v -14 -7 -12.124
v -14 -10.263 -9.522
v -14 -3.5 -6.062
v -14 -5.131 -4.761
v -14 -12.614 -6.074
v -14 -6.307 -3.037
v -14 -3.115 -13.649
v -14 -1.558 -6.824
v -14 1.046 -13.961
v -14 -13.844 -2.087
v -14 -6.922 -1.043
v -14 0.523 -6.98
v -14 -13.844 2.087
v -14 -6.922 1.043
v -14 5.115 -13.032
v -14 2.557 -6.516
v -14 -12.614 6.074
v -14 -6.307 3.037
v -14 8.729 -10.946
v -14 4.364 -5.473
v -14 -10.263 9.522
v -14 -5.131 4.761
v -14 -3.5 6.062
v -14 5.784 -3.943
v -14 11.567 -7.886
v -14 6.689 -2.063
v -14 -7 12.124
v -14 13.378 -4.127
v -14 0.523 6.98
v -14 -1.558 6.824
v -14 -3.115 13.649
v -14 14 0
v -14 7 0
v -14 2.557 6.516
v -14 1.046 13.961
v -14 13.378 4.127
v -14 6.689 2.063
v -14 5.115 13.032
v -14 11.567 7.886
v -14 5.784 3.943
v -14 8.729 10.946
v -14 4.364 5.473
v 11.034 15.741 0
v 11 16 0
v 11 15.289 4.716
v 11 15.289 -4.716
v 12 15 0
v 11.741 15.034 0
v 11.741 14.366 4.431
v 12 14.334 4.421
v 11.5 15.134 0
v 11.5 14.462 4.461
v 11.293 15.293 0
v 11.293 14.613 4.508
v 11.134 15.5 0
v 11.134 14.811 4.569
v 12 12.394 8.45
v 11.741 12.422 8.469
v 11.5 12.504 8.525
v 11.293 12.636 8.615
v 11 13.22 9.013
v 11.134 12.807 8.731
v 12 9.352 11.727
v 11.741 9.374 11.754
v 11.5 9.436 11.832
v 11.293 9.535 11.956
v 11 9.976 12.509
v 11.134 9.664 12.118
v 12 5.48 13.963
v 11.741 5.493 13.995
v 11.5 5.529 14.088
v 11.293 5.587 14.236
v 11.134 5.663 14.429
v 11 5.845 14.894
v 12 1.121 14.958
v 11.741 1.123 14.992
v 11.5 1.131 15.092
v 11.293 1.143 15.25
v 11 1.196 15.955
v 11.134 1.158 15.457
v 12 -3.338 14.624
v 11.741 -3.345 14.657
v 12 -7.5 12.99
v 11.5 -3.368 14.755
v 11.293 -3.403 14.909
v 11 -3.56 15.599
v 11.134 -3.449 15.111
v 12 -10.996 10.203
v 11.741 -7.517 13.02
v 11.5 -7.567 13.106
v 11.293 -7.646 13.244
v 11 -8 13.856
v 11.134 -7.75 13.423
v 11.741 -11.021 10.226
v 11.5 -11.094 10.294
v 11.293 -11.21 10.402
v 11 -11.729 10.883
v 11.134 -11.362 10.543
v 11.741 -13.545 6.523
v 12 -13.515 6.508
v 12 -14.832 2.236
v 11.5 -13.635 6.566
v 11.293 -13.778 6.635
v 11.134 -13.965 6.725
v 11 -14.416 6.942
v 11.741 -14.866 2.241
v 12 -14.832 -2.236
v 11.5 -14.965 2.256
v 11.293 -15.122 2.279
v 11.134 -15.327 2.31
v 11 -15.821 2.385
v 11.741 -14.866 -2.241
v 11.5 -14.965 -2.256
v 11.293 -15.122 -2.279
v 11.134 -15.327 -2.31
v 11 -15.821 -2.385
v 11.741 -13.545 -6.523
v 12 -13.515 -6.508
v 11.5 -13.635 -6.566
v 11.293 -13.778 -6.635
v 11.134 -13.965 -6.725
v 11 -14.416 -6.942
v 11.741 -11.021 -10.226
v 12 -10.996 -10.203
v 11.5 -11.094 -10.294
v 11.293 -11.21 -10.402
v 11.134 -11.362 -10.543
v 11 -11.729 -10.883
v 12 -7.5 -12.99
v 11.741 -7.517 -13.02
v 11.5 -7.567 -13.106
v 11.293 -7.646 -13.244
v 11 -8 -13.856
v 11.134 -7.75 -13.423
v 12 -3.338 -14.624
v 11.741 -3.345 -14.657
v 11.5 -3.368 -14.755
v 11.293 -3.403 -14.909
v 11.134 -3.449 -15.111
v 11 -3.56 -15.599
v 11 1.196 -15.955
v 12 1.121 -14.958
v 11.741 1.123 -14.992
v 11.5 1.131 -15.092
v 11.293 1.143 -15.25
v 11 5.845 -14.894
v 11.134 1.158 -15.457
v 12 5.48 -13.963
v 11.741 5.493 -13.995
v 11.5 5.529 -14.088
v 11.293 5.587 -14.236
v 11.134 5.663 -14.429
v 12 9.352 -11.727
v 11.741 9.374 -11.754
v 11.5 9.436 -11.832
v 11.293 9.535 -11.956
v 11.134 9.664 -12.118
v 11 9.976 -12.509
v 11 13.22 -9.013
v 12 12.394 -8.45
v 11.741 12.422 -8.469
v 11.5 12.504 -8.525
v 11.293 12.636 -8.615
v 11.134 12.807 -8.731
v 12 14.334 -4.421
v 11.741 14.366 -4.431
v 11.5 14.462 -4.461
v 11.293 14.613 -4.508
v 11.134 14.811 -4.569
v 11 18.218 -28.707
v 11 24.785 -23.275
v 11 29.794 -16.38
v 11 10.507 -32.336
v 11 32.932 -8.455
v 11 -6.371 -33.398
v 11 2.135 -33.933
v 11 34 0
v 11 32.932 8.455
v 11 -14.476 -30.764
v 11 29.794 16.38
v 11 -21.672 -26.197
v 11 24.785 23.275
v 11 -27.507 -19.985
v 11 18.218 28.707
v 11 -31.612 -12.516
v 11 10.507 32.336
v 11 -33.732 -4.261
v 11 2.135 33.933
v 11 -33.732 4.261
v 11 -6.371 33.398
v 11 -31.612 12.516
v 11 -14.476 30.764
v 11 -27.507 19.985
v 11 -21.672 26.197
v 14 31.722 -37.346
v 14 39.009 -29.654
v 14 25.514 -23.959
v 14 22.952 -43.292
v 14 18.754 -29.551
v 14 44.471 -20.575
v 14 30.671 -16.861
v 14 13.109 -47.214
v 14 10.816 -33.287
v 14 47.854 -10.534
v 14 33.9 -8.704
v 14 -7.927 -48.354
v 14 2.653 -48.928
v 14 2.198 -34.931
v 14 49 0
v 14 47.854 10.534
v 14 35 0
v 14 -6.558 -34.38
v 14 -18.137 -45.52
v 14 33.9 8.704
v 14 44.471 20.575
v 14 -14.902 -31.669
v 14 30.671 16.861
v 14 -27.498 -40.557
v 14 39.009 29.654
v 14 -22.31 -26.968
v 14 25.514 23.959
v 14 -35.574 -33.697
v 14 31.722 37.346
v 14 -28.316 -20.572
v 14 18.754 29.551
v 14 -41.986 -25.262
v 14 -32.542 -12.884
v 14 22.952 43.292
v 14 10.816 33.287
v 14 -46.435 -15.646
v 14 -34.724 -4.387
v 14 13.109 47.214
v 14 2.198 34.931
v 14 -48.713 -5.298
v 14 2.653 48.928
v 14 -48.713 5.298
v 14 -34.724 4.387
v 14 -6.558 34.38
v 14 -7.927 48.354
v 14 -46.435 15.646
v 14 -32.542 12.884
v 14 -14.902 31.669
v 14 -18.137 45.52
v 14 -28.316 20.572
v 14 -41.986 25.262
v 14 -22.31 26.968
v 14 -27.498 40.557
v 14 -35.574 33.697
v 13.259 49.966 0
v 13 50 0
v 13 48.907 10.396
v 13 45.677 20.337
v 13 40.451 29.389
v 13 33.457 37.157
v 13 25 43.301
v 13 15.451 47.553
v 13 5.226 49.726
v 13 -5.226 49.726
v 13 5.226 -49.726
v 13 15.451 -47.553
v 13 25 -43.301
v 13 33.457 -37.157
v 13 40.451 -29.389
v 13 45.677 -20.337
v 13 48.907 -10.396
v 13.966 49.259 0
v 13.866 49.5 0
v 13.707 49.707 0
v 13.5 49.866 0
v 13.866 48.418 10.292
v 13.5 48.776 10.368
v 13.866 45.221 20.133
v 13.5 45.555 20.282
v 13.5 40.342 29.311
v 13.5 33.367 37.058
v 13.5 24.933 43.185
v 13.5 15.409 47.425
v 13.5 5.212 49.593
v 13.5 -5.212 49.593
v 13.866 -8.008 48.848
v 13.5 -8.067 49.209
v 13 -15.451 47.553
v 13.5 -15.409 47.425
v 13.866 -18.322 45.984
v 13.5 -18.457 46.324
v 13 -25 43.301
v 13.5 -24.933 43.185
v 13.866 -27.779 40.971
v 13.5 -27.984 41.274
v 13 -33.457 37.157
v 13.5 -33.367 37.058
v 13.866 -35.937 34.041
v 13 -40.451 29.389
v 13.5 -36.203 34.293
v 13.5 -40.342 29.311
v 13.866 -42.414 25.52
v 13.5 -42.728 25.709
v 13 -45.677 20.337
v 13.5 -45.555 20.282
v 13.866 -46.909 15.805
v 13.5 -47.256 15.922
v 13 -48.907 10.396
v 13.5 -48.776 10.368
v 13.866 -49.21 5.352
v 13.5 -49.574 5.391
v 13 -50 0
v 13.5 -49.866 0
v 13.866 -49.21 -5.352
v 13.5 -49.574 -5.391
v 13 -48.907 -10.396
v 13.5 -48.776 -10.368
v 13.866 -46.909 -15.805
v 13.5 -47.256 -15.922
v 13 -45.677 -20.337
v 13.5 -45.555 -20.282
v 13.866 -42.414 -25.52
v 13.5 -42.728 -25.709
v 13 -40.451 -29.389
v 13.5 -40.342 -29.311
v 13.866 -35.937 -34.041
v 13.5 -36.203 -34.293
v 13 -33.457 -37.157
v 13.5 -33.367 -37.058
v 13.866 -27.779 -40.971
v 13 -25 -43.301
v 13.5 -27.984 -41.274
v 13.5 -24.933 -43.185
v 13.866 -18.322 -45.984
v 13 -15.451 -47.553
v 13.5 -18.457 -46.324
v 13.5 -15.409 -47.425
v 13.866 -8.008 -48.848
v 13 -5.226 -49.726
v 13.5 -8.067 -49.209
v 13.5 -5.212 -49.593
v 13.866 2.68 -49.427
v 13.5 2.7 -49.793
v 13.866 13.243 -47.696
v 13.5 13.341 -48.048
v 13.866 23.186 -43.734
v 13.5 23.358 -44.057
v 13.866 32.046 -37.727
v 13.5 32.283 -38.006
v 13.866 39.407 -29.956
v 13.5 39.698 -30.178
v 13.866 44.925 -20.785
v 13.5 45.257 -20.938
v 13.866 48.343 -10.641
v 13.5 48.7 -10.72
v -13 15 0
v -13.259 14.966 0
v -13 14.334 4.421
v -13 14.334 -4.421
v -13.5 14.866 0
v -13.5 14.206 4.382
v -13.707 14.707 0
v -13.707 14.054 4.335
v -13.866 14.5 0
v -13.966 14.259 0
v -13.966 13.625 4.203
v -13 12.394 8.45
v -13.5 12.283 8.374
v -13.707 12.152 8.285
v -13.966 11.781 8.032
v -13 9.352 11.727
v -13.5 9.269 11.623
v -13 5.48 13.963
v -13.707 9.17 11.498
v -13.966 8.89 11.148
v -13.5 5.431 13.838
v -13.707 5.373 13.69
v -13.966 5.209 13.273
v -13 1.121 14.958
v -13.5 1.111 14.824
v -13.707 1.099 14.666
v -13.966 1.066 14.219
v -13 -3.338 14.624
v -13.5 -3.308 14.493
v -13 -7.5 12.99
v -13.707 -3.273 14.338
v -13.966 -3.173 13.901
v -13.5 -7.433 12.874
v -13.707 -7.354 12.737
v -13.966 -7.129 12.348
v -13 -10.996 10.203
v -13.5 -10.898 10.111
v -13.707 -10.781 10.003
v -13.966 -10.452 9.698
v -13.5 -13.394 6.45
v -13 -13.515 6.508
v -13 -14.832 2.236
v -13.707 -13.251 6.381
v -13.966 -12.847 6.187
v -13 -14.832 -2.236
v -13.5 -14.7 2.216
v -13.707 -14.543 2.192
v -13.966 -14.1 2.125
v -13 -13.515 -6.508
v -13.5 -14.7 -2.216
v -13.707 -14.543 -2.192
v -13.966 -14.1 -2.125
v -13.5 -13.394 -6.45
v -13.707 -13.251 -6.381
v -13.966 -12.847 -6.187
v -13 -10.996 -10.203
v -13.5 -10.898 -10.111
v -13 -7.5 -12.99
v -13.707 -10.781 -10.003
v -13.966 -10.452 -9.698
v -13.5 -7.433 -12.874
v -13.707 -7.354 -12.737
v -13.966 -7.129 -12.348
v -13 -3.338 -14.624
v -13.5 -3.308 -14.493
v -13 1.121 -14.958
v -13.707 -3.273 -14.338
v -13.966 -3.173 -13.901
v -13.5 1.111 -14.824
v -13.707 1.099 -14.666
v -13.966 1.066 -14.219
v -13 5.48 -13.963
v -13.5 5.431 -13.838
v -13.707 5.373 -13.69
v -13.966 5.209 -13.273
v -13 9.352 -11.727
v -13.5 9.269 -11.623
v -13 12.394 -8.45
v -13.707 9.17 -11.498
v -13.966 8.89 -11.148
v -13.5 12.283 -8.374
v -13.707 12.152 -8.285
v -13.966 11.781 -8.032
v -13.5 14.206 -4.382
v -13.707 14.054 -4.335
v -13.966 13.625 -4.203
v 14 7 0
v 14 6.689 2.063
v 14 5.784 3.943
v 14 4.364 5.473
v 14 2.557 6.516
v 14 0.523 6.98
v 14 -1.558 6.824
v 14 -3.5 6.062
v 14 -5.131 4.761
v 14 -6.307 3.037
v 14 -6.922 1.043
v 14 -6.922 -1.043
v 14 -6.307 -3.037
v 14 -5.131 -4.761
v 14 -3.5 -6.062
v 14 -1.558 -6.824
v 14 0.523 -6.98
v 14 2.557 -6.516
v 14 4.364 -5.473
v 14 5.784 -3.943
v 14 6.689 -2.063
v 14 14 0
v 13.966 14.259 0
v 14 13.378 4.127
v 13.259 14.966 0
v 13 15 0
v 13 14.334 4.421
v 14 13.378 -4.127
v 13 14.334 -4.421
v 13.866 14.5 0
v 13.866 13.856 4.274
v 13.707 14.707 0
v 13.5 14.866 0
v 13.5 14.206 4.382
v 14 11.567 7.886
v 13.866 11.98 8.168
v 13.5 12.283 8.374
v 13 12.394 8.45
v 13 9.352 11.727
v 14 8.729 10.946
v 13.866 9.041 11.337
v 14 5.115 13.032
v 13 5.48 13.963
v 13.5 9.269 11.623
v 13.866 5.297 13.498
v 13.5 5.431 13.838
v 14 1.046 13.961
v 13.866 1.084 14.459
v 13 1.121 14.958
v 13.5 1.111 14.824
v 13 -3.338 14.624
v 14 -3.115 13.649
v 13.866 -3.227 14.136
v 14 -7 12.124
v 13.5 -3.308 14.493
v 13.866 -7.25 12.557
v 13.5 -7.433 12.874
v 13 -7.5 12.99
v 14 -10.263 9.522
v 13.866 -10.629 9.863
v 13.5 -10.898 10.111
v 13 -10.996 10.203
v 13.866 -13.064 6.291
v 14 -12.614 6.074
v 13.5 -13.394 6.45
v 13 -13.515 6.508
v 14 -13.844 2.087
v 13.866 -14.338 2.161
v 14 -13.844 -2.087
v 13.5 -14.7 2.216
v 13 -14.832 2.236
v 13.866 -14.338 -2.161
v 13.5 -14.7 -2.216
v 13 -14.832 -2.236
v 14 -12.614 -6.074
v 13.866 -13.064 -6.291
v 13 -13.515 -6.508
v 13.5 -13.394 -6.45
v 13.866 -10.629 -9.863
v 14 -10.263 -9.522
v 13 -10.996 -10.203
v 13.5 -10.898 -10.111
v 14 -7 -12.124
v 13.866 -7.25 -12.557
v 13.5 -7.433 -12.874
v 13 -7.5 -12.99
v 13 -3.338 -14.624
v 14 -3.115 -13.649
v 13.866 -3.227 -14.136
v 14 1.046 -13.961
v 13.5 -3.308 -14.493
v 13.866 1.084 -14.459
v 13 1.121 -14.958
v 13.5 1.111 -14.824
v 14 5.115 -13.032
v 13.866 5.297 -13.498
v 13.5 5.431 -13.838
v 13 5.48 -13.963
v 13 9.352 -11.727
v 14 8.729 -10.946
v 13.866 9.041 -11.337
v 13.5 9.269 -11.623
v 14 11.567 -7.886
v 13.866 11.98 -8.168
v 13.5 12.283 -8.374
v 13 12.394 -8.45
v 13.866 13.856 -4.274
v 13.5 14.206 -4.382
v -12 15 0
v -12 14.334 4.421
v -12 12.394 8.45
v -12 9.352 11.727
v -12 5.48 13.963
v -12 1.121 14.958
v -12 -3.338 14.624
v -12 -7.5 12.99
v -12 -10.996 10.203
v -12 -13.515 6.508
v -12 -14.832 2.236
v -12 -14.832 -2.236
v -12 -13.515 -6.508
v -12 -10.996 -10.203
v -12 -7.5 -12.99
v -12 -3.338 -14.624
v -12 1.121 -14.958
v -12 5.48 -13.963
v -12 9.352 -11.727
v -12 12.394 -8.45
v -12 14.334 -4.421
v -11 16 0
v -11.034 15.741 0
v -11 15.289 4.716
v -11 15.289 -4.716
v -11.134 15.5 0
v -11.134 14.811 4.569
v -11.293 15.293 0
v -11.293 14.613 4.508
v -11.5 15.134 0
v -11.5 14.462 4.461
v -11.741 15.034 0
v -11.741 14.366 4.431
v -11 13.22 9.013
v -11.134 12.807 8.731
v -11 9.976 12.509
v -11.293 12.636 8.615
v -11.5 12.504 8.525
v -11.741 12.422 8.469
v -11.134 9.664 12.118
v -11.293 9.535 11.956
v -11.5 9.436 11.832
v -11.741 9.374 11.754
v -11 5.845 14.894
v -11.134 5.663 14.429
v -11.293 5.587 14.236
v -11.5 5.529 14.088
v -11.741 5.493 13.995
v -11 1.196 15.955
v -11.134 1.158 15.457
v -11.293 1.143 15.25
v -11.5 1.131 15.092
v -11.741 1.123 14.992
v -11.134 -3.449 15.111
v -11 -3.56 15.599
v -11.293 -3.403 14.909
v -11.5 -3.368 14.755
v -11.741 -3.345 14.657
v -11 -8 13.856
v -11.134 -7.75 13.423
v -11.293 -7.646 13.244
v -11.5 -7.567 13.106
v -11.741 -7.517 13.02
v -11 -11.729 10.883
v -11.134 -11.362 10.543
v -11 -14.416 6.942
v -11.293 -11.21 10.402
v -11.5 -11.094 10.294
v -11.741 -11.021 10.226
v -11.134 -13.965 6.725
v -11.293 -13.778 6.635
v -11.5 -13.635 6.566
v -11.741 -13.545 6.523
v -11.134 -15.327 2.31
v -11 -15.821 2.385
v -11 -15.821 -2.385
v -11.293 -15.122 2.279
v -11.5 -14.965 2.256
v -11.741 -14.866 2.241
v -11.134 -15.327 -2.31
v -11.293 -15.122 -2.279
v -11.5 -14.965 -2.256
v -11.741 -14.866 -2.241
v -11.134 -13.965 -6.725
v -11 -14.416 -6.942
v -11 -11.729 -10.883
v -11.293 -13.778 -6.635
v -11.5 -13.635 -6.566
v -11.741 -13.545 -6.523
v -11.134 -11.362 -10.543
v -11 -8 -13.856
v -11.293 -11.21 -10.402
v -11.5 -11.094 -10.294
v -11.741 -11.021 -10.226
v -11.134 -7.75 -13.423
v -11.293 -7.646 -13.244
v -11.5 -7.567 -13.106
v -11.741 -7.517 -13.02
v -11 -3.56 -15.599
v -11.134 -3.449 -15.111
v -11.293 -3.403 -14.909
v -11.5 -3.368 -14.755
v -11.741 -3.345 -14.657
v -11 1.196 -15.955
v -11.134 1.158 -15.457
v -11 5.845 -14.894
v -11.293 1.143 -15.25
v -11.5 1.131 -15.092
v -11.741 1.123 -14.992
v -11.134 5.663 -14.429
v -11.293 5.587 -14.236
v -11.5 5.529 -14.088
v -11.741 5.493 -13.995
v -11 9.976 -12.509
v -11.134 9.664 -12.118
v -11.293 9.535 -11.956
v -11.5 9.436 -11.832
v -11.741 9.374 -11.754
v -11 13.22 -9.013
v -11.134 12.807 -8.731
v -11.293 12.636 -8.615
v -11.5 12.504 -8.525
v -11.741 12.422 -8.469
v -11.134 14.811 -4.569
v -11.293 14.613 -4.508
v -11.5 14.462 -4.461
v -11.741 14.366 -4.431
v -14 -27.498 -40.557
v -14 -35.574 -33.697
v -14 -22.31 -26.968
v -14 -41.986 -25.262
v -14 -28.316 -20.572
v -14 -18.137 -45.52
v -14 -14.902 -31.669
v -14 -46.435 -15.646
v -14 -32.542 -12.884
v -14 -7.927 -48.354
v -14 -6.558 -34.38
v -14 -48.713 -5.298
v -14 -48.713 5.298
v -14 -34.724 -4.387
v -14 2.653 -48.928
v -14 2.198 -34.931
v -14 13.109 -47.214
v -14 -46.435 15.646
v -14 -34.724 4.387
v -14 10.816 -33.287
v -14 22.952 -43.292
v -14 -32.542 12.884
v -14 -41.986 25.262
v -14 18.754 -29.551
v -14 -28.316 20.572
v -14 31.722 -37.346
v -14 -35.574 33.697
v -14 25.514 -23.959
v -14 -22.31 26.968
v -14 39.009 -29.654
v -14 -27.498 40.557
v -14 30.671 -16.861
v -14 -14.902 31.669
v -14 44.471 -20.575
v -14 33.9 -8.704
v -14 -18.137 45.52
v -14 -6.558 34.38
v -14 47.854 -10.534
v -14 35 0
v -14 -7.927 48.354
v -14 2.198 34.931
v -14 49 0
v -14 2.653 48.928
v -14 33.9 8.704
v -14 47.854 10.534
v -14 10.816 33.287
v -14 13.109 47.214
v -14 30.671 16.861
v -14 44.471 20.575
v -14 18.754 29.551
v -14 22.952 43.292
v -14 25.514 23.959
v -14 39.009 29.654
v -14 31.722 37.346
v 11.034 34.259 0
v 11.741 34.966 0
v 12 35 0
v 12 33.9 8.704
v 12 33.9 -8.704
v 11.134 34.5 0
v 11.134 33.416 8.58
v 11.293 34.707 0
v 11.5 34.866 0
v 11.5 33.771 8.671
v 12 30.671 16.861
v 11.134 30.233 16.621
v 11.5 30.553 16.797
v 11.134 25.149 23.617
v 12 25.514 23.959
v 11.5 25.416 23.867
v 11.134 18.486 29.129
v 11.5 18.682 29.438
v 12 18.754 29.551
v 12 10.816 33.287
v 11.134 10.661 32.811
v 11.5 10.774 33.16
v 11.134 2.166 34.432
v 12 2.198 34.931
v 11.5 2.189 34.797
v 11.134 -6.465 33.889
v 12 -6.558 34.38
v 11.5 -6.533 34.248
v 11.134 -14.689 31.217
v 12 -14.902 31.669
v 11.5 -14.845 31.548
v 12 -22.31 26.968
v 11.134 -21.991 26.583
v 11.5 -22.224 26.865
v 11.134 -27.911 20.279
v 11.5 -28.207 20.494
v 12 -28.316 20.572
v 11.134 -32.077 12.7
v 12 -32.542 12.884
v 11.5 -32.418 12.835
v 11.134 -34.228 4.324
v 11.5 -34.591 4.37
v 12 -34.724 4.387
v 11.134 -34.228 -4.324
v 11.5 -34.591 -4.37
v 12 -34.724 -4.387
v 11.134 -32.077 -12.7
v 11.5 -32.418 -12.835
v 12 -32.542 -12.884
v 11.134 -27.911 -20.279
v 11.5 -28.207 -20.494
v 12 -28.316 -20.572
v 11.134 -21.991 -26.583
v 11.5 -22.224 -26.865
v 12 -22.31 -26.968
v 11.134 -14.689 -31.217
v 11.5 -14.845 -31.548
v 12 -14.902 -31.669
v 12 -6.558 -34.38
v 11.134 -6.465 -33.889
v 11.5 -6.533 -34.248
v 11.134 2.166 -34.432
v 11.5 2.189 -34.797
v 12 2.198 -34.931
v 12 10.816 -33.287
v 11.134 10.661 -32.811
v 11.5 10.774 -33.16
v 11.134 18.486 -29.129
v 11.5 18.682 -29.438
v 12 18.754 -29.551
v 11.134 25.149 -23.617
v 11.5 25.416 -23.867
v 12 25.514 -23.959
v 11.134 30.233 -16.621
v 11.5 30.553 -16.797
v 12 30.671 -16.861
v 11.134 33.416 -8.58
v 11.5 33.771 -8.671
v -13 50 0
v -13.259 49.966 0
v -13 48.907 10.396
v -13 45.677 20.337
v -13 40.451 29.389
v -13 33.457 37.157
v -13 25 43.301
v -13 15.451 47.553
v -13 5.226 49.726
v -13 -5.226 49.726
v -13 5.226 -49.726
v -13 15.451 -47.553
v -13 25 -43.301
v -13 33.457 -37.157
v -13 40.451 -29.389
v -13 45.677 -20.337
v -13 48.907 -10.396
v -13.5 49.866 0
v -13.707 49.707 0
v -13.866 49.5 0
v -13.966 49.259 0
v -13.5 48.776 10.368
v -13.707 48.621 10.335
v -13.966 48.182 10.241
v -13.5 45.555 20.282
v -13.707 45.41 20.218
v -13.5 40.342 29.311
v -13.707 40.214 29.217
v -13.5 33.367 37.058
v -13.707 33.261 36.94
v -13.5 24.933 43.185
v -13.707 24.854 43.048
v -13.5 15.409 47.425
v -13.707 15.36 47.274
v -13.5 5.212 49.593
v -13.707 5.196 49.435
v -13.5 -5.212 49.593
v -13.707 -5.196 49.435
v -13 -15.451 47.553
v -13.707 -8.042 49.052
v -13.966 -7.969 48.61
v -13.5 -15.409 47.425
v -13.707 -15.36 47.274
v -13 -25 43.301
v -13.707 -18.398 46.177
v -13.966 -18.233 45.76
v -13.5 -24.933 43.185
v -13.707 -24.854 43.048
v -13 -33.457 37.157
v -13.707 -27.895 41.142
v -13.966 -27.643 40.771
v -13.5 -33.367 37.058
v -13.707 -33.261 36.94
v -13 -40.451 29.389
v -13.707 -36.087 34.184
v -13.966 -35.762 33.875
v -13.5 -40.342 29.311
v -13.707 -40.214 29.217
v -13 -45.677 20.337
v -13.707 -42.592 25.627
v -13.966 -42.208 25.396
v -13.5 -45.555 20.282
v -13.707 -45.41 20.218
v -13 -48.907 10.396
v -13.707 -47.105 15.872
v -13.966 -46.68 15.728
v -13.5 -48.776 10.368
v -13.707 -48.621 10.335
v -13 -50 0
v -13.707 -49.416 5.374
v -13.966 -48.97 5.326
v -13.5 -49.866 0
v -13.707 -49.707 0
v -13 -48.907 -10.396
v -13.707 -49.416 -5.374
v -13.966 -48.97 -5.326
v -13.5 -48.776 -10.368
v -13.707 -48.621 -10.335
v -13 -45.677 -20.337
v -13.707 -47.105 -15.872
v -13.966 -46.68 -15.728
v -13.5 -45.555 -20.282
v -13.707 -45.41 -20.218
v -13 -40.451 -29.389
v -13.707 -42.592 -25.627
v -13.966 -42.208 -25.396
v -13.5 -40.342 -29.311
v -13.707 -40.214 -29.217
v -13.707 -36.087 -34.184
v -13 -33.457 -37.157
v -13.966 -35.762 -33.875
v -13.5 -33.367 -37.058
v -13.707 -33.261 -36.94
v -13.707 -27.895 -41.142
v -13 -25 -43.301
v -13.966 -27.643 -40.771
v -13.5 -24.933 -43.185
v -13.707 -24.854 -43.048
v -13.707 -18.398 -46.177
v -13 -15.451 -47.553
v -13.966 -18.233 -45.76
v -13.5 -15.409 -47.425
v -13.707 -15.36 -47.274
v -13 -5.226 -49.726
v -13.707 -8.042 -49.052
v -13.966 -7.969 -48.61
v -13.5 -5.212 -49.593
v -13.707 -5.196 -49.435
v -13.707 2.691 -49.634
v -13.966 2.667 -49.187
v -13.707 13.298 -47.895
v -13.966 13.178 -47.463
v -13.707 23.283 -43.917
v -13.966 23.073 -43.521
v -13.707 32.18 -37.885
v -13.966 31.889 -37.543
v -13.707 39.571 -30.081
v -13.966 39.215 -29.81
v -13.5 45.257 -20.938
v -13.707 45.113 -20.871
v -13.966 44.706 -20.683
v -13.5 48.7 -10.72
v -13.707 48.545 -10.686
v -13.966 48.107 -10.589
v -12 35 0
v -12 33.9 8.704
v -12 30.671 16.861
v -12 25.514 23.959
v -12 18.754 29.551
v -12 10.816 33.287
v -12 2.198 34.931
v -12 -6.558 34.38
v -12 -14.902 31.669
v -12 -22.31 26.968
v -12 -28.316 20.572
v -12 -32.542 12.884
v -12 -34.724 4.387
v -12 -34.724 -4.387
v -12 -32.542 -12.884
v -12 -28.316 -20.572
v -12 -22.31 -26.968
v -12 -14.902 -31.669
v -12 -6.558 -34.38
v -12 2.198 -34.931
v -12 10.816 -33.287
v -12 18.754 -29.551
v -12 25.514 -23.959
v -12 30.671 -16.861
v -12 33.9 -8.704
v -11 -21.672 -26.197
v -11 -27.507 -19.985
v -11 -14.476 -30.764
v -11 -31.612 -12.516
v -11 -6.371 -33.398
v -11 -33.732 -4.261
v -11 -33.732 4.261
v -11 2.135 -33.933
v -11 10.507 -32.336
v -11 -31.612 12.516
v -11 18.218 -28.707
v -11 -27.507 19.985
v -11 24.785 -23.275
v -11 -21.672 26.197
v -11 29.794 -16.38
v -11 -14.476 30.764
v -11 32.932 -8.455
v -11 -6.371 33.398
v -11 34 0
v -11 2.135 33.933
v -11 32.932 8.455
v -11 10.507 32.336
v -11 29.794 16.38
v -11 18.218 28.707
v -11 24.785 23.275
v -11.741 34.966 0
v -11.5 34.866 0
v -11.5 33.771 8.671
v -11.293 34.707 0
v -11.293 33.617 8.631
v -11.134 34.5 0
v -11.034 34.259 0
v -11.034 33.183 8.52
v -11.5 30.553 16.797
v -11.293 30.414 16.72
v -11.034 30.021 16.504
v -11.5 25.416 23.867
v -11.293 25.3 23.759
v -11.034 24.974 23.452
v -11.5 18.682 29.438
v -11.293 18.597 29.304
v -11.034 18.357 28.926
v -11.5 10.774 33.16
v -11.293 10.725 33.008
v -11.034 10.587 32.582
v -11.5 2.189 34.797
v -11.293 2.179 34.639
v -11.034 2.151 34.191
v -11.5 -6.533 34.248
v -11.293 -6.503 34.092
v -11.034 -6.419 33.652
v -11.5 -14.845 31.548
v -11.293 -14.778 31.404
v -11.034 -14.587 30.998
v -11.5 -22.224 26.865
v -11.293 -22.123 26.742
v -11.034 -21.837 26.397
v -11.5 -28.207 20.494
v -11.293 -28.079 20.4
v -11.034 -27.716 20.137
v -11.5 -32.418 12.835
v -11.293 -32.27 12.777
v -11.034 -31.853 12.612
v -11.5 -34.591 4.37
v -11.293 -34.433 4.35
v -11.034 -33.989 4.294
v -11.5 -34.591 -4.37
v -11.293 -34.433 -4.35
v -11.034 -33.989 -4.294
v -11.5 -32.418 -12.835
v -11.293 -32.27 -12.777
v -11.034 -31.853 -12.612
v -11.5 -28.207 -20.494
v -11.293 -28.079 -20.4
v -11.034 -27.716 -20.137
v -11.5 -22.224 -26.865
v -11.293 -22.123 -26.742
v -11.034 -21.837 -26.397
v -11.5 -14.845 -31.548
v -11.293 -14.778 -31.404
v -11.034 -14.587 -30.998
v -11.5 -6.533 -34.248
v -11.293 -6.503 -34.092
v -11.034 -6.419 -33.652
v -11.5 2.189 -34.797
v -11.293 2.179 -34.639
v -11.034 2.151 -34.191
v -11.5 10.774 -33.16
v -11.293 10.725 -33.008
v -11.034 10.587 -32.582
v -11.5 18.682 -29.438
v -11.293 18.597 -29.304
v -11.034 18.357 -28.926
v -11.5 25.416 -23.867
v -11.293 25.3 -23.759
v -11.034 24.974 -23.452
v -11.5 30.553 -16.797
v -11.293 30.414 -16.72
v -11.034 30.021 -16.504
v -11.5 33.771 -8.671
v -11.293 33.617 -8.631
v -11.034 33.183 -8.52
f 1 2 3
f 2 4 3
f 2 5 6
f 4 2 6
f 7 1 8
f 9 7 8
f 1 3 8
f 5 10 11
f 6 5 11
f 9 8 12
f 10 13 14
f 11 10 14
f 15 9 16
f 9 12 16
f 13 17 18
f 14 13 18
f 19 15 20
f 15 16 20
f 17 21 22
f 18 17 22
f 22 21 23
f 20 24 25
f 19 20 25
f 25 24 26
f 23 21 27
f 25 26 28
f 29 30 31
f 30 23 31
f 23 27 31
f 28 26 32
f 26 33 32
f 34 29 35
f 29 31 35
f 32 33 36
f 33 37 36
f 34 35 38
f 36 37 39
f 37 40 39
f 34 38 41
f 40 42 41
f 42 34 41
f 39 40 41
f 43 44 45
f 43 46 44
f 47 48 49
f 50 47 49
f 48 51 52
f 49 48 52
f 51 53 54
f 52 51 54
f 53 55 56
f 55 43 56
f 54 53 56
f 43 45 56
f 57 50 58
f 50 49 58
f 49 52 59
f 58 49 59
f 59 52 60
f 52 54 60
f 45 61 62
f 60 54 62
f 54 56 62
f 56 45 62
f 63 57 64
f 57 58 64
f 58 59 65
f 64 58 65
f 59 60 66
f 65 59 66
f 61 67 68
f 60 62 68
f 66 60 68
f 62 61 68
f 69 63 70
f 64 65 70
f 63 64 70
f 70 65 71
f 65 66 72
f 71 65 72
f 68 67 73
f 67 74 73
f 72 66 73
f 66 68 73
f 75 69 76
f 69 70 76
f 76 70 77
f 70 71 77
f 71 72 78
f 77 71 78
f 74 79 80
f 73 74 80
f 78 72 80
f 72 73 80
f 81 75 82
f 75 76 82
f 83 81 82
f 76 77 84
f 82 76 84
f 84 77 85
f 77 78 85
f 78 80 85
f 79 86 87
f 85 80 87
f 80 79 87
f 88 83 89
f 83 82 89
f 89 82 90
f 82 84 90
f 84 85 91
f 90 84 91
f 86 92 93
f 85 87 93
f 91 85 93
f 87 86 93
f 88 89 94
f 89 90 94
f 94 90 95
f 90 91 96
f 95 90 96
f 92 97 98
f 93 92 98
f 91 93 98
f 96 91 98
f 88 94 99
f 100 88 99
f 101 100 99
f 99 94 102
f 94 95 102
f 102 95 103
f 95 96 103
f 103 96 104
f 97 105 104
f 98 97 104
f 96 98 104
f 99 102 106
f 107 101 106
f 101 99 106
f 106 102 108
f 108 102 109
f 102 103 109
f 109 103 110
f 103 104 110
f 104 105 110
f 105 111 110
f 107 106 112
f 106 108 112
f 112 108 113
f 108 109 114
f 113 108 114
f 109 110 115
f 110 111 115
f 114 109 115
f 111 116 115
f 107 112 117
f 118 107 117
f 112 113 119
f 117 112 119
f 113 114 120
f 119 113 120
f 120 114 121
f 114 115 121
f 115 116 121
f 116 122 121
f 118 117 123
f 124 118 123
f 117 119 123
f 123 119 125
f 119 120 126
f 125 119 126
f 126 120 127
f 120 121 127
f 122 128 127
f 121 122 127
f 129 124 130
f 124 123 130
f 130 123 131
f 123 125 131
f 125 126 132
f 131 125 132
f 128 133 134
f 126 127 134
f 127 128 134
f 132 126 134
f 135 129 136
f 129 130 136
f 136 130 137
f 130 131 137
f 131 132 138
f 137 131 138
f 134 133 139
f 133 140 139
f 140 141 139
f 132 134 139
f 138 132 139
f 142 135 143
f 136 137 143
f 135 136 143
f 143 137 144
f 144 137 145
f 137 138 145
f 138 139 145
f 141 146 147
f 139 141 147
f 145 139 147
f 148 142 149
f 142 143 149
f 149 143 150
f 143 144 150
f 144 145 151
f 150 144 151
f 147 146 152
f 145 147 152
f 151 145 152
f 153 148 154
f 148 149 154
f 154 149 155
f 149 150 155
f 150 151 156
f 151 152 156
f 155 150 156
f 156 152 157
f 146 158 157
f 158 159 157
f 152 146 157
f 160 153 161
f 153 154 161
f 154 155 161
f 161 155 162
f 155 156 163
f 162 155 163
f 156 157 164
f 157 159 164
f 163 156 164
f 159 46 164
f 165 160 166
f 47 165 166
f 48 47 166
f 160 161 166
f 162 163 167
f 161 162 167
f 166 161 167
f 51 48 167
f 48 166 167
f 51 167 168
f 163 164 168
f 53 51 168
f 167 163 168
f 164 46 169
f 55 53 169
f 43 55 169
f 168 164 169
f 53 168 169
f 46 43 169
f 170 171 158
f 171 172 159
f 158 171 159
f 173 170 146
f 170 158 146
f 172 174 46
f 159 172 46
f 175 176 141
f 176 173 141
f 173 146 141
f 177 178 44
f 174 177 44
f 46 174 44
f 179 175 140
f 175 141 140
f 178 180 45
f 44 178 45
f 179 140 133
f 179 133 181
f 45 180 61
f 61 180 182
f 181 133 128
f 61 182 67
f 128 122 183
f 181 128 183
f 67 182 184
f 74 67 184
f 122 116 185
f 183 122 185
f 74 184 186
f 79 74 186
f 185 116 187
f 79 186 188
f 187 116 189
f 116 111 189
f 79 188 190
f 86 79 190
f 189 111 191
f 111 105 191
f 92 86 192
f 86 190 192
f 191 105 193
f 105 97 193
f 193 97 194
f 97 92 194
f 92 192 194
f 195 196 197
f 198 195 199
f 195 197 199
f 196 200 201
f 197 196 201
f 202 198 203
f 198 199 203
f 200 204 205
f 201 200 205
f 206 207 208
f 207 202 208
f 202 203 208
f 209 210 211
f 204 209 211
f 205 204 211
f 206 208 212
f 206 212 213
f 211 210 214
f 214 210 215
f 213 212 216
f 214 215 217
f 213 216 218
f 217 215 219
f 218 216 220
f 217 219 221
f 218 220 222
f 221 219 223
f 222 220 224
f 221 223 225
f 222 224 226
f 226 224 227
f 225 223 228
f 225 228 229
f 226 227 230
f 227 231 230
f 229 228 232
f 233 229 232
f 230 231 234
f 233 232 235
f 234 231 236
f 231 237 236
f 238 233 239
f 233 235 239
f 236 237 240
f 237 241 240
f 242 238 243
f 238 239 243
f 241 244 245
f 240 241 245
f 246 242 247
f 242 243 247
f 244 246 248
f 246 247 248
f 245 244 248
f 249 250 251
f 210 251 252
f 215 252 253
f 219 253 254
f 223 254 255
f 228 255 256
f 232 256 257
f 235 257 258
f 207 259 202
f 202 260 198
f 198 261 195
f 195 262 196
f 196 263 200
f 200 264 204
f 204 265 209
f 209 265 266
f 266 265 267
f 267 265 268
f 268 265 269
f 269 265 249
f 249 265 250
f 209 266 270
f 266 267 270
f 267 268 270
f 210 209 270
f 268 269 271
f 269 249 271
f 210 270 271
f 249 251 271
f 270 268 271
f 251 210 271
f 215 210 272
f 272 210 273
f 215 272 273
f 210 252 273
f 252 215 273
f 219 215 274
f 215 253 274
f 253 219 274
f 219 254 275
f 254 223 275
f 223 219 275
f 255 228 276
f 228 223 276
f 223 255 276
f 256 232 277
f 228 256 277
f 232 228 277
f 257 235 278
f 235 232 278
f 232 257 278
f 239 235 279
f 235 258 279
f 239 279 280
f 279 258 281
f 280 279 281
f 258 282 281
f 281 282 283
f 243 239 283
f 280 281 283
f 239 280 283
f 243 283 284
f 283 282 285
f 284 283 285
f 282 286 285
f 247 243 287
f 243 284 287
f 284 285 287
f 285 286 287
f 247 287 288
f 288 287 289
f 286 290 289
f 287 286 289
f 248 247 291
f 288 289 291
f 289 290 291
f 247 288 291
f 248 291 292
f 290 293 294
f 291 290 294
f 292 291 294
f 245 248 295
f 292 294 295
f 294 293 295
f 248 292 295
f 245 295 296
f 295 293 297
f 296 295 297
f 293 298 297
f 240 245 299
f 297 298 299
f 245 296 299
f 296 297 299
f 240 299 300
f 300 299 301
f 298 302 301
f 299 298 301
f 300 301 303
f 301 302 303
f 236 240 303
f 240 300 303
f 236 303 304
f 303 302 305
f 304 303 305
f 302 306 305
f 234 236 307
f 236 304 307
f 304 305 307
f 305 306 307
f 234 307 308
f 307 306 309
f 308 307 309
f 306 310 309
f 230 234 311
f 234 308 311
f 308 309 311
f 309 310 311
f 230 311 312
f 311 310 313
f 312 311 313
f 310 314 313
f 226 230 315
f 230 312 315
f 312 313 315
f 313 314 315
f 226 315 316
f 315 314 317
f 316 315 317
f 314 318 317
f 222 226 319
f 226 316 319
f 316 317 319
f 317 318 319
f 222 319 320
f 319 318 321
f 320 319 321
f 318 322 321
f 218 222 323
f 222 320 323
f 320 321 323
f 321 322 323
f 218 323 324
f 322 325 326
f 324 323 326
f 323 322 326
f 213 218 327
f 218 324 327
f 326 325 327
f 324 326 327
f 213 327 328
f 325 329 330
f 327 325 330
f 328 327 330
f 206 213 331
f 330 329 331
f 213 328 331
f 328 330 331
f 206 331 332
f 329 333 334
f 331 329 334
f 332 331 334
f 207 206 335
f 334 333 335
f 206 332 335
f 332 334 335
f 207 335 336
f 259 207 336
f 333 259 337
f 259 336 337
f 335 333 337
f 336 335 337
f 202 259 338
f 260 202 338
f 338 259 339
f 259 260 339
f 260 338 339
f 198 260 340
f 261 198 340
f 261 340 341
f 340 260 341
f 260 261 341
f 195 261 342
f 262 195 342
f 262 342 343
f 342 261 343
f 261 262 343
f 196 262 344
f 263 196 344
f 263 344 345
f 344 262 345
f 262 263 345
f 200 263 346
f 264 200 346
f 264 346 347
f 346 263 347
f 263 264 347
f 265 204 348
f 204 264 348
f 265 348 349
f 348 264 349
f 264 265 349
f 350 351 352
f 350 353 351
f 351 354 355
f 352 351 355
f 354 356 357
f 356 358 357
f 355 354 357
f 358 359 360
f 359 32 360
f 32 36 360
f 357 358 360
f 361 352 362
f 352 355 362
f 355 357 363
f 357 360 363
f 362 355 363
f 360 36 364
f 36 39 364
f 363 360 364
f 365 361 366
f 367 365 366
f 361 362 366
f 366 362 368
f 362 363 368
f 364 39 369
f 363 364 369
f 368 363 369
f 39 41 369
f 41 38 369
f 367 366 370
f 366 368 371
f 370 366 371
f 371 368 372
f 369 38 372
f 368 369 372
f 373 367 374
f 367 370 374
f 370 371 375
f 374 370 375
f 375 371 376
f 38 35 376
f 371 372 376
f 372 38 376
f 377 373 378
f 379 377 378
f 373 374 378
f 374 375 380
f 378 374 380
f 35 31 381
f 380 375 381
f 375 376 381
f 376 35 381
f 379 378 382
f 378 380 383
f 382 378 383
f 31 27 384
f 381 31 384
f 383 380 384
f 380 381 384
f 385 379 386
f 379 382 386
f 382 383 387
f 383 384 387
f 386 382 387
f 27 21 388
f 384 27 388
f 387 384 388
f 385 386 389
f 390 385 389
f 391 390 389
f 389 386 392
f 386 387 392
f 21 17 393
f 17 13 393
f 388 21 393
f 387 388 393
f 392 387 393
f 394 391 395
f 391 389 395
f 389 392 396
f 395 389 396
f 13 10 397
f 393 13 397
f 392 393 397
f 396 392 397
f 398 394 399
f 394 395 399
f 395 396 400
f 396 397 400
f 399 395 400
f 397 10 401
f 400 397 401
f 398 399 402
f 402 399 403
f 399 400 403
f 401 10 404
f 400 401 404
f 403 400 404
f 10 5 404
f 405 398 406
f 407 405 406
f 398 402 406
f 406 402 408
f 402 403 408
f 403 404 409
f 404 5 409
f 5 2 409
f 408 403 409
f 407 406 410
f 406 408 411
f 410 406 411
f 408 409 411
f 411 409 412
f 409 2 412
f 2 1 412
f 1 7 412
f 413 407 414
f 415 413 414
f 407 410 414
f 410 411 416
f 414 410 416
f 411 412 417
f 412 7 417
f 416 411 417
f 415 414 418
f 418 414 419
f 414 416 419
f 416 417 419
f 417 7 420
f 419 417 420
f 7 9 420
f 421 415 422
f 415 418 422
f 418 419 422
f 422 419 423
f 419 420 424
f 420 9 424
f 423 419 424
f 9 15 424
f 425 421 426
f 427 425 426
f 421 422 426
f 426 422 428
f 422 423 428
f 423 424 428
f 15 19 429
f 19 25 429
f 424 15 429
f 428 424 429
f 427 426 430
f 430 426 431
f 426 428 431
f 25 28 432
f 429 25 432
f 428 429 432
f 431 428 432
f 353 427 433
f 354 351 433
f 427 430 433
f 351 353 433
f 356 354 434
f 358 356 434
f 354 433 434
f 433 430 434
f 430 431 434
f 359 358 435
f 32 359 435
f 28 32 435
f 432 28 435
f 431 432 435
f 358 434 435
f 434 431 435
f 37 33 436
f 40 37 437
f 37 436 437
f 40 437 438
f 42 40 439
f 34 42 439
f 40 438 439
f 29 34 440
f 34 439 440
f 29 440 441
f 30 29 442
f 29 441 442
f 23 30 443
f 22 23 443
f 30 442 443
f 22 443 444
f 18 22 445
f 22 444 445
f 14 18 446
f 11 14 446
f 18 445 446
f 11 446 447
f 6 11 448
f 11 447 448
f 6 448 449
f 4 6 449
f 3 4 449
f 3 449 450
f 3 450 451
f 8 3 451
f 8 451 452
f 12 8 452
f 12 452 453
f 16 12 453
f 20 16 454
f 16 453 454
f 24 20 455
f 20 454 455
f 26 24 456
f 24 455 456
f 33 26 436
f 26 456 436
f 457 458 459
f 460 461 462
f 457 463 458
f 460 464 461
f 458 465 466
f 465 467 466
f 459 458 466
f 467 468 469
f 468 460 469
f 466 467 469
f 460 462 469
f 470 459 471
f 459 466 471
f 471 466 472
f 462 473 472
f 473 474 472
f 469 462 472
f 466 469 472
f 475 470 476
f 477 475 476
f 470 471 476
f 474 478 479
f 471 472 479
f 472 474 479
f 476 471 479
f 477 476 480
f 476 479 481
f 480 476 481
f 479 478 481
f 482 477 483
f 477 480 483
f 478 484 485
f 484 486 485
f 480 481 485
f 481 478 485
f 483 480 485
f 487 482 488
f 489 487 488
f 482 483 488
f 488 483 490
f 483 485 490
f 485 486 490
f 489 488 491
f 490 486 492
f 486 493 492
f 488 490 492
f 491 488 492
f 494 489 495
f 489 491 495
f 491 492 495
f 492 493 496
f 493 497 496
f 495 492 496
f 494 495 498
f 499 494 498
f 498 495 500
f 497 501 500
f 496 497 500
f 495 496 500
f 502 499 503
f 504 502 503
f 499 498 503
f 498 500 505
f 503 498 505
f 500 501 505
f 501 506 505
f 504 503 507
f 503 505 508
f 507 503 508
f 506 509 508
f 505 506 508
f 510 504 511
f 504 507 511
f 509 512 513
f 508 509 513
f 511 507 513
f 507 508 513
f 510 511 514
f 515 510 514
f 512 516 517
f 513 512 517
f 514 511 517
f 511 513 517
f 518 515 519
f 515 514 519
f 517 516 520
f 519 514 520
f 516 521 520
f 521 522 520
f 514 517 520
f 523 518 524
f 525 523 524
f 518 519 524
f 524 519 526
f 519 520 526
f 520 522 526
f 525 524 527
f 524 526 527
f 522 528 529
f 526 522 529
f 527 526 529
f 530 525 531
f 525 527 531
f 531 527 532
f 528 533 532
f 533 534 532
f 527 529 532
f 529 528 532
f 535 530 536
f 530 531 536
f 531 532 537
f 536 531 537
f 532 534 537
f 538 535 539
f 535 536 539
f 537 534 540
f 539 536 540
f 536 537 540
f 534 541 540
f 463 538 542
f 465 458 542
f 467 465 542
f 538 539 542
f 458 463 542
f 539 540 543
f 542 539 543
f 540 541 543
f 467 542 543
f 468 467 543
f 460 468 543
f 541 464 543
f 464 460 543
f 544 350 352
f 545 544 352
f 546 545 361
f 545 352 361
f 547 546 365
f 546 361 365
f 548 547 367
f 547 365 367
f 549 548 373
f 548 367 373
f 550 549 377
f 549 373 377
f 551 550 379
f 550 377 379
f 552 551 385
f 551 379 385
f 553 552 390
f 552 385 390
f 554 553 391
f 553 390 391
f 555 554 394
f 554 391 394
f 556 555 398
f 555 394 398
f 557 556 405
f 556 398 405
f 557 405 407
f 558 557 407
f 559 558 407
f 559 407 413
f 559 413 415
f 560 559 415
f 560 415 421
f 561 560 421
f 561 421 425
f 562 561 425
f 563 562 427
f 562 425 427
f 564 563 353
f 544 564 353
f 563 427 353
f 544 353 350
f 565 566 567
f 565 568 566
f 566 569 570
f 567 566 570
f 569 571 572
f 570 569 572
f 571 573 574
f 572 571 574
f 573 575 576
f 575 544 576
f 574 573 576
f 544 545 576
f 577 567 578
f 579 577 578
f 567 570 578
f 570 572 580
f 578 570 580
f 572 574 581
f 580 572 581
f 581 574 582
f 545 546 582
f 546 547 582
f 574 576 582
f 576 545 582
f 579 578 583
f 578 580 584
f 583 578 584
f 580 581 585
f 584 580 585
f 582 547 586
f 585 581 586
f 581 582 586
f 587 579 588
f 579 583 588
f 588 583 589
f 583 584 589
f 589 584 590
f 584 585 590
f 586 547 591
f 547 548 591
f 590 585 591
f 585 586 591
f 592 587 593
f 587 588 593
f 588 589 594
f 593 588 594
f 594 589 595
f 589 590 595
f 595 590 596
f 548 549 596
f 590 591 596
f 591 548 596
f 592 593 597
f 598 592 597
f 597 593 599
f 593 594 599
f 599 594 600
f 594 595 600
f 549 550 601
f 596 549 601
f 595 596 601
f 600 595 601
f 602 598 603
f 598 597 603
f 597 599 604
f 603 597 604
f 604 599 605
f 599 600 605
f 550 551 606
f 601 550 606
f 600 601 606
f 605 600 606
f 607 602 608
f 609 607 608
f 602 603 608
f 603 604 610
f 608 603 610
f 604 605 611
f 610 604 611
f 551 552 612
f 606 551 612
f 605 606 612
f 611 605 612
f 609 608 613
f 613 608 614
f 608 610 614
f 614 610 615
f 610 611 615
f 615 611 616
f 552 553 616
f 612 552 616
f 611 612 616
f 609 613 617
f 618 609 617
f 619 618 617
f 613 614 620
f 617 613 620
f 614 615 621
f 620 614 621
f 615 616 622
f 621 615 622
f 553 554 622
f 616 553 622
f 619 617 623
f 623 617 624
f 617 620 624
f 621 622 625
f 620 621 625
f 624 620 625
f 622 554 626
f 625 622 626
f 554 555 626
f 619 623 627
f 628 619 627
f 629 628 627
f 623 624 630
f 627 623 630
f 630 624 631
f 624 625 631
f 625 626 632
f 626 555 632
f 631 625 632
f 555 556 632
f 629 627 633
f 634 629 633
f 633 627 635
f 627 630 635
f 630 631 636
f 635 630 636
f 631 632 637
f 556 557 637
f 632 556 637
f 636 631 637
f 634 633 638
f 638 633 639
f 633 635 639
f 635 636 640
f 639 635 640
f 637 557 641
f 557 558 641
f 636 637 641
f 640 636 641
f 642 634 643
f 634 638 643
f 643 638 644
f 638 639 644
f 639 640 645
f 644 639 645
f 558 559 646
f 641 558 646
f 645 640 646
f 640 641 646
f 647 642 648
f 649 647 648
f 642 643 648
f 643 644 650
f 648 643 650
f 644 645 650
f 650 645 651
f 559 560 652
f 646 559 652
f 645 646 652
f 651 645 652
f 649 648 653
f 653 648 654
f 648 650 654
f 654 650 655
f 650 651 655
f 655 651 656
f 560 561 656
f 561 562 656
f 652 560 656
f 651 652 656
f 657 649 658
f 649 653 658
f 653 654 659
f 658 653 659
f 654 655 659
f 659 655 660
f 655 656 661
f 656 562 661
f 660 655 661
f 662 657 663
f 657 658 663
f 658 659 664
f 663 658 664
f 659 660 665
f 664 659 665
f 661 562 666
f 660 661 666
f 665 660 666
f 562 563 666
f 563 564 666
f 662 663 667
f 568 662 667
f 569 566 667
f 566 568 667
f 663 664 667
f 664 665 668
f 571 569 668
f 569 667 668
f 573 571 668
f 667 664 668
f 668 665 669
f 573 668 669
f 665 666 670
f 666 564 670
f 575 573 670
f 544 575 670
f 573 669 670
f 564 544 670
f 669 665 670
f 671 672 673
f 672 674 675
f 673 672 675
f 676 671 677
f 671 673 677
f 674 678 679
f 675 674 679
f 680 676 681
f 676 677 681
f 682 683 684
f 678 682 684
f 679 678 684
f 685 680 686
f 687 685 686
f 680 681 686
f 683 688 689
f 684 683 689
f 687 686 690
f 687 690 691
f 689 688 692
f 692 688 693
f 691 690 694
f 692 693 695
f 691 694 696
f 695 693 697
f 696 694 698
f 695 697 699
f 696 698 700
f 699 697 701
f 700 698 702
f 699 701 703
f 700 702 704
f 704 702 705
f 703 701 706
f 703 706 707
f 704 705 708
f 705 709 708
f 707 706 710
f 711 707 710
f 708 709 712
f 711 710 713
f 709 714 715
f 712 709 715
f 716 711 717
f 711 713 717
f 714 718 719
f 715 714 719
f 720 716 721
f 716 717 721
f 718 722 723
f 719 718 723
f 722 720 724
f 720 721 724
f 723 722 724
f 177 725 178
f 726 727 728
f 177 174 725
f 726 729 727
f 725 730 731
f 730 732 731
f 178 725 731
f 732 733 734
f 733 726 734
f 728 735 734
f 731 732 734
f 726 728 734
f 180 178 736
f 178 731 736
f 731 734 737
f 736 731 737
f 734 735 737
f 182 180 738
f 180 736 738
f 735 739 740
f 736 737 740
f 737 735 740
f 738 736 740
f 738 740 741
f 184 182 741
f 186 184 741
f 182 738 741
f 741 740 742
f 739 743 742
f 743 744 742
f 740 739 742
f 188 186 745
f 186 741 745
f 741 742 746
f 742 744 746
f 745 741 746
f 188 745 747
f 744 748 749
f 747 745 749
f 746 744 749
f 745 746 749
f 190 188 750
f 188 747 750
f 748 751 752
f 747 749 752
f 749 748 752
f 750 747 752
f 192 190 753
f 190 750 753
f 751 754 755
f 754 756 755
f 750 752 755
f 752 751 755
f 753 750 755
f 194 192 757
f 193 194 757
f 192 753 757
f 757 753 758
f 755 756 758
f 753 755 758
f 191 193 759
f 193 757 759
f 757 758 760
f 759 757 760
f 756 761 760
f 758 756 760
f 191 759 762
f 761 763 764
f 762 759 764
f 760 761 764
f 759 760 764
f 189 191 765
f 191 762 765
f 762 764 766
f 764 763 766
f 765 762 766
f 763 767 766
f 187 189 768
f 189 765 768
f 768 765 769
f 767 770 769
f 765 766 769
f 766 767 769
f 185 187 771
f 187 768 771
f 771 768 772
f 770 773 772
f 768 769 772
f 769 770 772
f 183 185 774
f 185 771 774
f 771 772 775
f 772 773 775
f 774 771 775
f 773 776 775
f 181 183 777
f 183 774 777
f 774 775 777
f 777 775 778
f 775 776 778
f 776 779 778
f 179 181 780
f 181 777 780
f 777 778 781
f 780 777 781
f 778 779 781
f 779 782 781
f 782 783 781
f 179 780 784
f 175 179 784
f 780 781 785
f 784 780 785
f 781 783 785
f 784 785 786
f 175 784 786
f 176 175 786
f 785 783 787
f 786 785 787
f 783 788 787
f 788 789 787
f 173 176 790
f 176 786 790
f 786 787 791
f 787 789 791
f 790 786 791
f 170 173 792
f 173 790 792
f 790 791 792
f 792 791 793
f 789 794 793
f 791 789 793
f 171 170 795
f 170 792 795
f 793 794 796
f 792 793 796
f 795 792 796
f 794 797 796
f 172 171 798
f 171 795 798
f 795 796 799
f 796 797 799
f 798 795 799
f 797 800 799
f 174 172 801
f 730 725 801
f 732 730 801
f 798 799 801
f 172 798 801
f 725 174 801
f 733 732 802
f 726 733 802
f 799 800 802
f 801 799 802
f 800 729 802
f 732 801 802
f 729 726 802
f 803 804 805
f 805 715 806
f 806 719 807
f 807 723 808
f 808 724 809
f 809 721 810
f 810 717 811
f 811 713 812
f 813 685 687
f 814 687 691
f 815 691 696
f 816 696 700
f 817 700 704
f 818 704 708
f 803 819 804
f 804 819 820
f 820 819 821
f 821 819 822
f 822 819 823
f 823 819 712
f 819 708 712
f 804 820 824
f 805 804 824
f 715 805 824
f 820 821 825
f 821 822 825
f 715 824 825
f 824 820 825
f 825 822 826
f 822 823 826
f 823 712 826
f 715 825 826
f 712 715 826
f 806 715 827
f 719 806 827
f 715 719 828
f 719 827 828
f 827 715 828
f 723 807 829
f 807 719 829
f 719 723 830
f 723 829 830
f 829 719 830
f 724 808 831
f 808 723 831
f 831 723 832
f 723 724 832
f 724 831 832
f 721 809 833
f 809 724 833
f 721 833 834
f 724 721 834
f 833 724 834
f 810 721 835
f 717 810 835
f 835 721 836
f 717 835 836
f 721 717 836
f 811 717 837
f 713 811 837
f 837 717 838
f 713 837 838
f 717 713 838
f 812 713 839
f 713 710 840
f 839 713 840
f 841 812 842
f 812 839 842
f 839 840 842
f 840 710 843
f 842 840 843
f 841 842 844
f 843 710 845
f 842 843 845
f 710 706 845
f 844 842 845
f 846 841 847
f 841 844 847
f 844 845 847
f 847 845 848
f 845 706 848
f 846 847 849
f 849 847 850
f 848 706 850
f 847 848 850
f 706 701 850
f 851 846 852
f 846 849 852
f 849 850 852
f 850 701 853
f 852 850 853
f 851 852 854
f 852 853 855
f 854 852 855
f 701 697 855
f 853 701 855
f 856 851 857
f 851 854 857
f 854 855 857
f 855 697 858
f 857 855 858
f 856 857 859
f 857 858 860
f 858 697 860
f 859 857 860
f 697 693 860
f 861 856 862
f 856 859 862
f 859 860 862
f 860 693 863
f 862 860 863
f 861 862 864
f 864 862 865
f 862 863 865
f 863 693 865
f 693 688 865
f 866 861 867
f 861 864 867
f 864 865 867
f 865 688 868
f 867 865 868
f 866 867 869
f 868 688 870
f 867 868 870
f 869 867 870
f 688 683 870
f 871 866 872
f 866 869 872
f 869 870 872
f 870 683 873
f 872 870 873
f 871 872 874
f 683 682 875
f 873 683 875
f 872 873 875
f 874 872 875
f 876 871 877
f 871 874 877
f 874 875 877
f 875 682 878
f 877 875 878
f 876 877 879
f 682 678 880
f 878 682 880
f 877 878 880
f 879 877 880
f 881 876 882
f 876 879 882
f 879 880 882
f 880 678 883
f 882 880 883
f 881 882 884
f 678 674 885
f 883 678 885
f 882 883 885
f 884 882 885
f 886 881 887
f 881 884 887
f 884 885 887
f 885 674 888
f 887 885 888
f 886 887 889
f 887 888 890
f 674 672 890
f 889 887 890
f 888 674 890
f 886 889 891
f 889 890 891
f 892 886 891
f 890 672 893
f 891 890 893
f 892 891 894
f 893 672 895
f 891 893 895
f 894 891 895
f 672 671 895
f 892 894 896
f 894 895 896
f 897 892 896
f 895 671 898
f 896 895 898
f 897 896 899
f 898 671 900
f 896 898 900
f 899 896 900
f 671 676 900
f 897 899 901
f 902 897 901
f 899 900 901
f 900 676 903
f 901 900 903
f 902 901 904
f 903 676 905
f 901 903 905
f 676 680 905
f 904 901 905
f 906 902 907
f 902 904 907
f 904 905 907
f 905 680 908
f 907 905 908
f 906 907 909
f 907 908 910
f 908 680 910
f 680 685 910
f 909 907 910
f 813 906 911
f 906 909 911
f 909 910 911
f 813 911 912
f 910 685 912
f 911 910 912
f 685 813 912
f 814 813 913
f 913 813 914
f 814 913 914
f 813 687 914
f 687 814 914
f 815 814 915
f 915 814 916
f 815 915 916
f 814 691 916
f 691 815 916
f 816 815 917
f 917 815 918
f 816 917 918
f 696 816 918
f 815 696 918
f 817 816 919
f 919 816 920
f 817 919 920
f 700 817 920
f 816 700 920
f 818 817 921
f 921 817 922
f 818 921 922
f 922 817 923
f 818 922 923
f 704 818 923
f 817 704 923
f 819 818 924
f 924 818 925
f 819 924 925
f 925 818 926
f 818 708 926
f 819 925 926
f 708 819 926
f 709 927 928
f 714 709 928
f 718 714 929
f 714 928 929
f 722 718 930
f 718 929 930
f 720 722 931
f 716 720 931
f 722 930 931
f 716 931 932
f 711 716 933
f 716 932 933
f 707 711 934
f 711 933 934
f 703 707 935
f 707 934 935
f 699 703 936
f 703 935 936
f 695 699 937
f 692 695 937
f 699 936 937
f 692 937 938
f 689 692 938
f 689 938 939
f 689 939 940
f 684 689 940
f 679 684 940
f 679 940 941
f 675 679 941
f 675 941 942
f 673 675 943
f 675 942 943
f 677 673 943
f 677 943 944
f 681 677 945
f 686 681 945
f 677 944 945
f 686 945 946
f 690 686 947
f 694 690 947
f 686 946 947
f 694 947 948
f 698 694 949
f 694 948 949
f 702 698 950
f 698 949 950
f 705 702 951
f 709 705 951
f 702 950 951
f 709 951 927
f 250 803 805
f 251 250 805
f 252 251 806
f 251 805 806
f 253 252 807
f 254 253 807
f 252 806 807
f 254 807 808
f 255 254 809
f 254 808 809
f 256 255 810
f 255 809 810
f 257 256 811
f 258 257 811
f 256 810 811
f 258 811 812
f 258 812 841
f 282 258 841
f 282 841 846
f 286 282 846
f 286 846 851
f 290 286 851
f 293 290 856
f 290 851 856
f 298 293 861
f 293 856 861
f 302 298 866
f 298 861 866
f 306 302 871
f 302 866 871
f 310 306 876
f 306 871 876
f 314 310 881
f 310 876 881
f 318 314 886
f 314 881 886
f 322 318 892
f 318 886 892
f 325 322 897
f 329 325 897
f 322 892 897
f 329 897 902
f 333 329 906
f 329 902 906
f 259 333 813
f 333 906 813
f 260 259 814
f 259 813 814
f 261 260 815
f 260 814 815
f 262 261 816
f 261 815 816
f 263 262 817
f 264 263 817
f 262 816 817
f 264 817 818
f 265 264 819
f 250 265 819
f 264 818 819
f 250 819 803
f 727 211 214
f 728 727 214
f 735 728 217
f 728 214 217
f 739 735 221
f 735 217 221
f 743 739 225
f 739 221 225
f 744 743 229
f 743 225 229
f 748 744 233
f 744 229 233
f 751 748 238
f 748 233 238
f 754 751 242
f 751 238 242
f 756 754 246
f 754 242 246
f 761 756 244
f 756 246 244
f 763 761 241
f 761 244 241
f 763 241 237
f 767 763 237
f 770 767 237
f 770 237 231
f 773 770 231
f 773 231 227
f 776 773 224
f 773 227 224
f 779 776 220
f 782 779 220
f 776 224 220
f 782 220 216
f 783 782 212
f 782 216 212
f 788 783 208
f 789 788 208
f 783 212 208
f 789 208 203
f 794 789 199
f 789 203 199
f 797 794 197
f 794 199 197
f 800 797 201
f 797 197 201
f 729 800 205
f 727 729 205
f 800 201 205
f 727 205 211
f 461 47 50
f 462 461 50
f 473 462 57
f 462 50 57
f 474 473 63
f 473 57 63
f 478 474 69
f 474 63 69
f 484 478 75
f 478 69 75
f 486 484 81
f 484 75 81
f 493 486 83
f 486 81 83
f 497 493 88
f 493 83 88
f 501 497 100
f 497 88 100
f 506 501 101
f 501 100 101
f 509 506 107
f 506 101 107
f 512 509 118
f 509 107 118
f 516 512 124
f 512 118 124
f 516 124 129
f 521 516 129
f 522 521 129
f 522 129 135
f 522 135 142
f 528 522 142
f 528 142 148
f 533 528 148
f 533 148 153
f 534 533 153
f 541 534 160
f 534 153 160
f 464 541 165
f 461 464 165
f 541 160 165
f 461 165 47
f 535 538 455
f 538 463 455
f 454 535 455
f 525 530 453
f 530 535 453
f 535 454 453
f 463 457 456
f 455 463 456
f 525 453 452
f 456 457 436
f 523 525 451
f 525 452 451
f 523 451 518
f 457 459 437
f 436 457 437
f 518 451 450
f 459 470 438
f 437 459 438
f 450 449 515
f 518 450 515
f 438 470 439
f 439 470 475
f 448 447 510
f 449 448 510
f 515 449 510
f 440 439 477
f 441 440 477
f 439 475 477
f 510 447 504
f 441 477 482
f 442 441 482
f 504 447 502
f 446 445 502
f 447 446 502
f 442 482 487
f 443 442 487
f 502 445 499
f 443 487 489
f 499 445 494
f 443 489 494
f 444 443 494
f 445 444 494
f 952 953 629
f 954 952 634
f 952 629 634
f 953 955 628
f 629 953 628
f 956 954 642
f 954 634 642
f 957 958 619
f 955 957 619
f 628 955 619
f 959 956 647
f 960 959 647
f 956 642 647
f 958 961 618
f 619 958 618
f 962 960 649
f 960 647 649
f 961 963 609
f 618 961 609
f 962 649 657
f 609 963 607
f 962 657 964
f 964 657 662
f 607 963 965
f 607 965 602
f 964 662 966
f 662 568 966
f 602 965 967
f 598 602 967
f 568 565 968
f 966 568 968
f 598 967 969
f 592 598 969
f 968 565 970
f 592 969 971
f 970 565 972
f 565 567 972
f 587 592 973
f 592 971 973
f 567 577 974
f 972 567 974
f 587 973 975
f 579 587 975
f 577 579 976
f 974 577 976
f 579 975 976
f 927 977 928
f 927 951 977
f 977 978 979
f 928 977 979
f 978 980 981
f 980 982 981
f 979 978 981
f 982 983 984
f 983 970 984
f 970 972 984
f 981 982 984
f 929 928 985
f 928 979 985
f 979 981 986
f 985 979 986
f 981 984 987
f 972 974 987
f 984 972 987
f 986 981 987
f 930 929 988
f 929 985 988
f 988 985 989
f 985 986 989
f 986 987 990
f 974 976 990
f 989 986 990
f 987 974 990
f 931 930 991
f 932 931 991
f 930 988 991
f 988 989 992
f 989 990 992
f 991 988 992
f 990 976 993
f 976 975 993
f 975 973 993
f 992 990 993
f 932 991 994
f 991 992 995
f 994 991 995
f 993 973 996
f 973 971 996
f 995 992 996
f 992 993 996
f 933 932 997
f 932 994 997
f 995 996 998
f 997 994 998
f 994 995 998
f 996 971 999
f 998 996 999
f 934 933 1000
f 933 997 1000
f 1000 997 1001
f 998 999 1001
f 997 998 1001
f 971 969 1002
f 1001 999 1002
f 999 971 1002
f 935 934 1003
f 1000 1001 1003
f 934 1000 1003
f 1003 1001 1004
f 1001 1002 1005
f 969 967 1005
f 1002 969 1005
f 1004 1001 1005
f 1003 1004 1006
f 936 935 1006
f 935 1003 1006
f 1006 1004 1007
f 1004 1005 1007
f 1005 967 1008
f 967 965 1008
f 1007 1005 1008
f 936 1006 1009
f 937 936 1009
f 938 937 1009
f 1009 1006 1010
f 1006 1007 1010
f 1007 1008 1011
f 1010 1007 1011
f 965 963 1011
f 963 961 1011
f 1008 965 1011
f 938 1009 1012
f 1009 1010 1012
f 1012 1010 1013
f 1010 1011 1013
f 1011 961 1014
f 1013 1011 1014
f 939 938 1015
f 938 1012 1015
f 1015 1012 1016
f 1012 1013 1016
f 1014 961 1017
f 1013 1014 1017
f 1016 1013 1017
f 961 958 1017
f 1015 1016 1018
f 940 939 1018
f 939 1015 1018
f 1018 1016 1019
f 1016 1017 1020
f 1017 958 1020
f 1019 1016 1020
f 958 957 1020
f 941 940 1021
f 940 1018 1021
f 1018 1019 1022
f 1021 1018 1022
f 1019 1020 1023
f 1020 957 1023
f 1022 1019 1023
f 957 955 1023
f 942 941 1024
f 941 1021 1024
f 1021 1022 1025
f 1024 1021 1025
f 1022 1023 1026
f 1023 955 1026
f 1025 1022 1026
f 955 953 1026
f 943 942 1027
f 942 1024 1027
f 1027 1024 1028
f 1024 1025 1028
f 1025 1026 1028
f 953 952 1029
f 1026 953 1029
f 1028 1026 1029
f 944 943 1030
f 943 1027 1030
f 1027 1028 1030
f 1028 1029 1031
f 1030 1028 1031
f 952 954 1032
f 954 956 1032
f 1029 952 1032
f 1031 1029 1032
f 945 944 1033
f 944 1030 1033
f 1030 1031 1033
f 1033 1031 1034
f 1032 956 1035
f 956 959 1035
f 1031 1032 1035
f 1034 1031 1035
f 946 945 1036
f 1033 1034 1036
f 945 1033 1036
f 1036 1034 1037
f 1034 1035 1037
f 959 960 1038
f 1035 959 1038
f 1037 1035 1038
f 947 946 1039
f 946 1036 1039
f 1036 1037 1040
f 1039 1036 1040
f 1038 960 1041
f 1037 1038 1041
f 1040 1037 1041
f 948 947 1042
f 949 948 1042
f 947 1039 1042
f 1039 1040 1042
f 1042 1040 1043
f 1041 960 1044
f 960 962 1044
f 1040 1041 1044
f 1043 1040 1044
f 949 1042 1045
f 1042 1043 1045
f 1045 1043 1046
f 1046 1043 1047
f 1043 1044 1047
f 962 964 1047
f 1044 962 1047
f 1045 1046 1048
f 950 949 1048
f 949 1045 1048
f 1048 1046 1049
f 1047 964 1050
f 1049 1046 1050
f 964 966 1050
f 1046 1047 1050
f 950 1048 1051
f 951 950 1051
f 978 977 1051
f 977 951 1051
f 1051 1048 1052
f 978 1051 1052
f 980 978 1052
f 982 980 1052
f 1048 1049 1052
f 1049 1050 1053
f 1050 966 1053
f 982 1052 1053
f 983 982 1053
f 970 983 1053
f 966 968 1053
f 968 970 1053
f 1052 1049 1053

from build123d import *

# Parameters (mm, degrees)
FILLET1_R = 1


with BuildPart() as part:
    # Sketch1 → Revolve1 (revolve)
    with BuildSketch(Plane.XY):
        Polygon((-14, 7), (14, 7), (14, 15), (11, 15), (11, 35), (14, 35), (14, 50), (-14, 50), (-14, 35), (-11, 35), (-11, 15), (-14, 15), align=None)
    revolve(axis=Axis((0, 0, 0), (1, 0, 0)))

    # Fillet1
    fillet1_edges = [part.edges().sort_by_distance(p)[0] for p in [
        (-14, -50, 0),
        (14, -50, 0),
        (11, -35, 0),
        (11, -15, 0),
        (14, -15, 0),
        (-14, -15, 0),
        (-11, -15, 0),
        (-11, -35, 0),
    ]]
    fillet(fillet1_edges, radius=FILLET1_R)


solid = part.part
